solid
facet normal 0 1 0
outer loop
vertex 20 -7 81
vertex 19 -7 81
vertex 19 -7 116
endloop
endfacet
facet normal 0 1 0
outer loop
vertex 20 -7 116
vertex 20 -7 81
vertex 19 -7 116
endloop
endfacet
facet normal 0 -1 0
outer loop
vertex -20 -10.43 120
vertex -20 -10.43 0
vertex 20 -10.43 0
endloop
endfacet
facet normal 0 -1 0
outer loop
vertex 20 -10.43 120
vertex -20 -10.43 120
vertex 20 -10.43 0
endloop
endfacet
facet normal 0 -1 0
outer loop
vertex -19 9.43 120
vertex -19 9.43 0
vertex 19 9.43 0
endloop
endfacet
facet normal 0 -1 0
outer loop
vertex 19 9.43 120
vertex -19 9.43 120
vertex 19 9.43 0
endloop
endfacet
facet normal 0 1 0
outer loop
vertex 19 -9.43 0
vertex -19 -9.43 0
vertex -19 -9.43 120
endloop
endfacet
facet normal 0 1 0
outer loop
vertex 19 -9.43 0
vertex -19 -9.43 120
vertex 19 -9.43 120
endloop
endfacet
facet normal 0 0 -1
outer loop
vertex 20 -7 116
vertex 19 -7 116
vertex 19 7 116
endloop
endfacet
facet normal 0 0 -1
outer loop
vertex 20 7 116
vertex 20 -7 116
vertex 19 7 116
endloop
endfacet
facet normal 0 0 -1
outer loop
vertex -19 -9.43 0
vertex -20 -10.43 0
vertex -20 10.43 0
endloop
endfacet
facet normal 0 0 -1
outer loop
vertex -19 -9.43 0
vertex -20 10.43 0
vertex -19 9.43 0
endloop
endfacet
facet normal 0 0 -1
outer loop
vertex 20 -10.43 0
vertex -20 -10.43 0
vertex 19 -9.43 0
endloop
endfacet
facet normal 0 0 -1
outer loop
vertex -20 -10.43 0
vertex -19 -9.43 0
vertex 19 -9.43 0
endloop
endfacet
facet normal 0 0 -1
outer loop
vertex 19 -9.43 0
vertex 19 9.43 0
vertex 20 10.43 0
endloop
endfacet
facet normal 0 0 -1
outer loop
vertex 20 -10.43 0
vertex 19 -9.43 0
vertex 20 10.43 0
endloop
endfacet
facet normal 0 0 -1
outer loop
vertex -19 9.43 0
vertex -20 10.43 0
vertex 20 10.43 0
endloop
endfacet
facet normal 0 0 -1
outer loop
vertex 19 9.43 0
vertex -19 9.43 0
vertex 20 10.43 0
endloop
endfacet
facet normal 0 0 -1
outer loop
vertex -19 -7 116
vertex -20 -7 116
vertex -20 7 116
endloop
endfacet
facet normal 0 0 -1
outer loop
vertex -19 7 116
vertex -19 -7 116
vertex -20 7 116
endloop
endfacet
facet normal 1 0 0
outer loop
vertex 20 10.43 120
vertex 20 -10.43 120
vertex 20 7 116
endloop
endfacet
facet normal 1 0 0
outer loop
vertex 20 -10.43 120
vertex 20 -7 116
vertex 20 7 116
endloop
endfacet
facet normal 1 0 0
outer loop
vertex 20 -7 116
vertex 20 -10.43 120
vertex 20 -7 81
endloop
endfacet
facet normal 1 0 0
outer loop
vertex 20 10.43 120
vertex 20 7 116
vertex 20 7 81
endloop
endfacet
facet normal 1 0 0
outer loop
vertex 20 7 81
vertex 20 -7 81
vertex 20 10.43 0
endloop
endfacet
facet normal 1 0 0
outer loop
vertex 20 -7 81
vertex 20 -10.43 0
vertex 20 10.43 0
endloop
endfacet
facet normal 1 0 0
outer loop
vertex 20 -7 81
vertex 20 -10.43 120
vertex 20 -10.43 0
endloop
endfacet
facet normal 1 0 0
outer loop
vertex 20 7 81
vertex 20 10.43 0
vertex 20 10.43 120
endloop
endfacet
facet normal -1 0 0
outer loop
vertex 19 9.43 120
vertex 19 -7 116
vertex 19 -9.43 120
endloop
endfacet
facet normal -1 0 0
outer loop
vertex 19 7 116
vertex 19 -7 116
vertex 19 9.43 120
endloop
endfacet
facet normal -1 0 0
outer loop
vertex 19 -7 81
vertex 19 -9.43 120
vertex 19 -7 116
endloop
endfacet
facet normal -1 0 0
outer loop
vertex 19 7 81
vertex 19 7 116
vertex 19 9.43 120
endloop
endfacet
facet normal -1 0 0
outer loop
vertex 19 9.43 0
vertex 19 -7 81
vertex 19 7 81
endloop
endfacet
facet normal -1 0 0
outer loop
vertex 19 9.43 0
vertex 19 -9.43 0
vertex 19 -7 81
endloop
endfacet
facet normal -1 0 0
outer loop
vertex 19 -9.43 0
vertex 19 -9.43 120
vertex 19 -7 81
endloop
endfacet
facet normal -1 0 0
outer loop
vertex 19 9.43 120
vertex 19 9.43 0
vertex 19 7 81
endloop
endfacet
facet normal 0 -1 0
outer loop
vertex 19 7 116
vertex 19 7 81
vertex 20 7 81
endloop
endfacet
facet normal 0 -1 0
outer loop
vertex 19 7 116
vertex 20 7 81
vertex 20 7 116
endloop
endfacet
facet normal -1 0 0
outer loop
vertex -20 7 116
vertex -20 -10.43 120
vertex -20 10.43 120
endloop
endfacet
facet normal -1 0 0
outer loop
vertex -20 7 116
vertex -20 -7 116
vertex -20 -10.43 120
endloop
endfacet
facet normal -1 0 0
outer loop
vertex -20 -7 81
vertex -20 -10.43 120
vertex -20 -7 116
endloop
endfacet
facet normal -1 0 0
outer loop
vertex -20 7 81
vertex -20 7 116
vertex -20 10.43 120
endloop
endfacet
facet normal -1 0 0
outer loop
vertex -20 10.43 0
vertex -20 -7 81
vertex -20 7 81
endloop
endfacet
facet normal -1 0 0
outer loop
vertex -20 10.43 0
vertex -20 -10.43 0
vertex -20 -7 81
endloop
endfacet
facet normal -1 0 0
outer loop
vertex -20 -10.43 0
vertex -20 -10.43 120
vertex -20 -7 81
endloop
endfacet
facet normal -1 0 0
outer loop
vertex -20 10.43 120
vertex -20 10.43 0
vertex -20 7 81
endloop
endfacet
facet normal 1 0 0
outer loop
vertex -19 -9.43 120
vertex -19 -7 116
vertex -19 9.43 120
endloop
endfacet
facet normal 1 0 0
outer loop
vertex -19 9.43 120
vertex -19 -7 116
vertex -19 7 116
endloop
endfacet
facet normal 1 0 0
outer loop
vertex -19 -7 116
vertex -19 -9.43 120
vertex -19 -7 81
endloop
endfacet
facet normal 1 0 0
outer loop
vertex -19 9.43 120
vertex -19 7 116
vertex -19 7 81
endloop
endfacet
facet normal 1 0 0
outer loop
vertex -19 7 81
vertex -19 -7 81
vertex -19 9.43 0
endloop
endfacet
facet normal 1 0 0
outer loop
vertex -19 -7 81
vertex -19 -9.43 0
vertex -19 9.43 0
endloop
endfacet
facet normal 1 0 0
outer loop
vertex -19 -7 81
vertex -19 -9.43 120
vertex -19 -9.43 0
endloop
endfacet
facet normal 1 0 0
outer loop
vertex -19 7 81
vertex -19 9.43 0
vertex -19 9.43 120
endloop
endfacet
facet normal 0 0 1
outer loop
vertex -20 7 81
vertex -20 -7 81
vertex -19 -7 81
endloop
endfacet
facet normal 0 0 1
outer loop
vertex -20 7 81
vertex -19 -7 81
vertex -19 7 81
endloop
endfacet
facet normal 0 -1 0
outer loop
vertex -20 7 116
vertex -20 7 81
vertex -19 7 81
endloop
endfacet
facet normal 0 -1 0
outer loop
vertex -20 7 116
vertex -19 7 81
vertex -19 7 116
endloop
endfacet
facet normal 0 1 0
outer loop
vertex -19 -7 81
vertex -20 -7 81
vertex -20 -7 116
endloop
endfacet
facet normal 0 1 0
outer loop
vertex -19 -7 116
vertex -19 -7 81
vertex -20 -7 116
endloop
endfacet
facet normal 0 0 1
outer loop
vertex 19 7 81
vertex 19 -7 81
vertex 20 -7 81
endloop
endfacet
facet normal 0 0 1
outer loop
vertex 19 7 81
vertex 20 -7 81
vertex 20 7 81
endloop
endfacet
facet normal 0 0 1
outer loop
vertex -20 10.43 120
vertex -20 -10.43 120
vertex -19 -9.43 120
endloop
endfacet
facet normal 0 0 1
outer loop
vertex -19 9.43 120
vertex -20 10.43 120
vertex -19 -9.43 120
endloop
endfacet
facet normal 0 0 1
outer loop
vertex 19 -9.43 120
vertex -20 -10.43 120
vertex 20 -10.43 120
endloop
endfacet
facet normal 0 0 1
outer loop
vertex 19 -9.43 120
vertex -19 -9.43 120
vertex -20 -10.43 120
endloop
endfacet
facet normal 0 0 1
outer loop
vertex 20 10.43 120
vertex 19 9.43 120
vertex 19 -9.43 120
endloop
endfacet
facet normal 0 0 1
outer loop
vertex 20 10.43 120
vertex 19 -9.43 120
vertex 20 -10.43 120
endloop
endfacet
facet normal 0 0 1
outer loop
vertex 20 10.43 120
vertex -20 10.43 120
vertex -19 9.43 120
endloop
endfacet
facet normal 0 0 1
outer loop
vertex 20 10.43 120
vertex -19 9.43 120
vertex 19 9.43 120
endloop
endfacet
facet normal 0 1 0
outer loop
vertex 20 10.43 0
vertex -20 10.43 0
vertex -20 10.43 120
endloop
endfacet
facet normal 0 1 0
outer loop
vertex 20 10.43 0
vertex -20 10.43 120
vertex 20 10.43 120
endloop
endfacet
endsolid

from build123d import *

# Parameters (mm, degrees)
CROQUIS1_W              = 40
CROQUIS1_H              = 20.86
CROQUIS1_W_2            = 38
CROQUIS1_H_2            = 18.86
SALIENTE_EXTRUIR1_DEPTH = 120
CROQUIS2_W              = 35
CROQUIS2_H              = 14
CORTAR_EXTRUIR1_DEPTH   = 120


with BuildPart() as part:
    # Croquis1 → Saliente-Extruir1 (new body)
    with BuildSketch(Plane.XY):
        Rectangle(CROQUIS1_W, CROQUIS1_H)
        Rectangle(CROQUIS1_W_2, CROQUIS1_H_2, mode=Mode.SUBTRACT)
    extrude(amount=SALIENTE_EXTRUIR1_DEPTH)

    # Croquis2 → Cortar-Extruir1 (cut)
    with BuildSketch(Plane.ZY.offset(20)):
        with Locations((98.5, 0)):
            Rectangle(CROQUIS2_W, CROQUIS2_H)
    extrude(amount=-CORTAR_EXTRUIR1_DEPTH, mode=Mode.SUBTRACT)


solid = part.part
